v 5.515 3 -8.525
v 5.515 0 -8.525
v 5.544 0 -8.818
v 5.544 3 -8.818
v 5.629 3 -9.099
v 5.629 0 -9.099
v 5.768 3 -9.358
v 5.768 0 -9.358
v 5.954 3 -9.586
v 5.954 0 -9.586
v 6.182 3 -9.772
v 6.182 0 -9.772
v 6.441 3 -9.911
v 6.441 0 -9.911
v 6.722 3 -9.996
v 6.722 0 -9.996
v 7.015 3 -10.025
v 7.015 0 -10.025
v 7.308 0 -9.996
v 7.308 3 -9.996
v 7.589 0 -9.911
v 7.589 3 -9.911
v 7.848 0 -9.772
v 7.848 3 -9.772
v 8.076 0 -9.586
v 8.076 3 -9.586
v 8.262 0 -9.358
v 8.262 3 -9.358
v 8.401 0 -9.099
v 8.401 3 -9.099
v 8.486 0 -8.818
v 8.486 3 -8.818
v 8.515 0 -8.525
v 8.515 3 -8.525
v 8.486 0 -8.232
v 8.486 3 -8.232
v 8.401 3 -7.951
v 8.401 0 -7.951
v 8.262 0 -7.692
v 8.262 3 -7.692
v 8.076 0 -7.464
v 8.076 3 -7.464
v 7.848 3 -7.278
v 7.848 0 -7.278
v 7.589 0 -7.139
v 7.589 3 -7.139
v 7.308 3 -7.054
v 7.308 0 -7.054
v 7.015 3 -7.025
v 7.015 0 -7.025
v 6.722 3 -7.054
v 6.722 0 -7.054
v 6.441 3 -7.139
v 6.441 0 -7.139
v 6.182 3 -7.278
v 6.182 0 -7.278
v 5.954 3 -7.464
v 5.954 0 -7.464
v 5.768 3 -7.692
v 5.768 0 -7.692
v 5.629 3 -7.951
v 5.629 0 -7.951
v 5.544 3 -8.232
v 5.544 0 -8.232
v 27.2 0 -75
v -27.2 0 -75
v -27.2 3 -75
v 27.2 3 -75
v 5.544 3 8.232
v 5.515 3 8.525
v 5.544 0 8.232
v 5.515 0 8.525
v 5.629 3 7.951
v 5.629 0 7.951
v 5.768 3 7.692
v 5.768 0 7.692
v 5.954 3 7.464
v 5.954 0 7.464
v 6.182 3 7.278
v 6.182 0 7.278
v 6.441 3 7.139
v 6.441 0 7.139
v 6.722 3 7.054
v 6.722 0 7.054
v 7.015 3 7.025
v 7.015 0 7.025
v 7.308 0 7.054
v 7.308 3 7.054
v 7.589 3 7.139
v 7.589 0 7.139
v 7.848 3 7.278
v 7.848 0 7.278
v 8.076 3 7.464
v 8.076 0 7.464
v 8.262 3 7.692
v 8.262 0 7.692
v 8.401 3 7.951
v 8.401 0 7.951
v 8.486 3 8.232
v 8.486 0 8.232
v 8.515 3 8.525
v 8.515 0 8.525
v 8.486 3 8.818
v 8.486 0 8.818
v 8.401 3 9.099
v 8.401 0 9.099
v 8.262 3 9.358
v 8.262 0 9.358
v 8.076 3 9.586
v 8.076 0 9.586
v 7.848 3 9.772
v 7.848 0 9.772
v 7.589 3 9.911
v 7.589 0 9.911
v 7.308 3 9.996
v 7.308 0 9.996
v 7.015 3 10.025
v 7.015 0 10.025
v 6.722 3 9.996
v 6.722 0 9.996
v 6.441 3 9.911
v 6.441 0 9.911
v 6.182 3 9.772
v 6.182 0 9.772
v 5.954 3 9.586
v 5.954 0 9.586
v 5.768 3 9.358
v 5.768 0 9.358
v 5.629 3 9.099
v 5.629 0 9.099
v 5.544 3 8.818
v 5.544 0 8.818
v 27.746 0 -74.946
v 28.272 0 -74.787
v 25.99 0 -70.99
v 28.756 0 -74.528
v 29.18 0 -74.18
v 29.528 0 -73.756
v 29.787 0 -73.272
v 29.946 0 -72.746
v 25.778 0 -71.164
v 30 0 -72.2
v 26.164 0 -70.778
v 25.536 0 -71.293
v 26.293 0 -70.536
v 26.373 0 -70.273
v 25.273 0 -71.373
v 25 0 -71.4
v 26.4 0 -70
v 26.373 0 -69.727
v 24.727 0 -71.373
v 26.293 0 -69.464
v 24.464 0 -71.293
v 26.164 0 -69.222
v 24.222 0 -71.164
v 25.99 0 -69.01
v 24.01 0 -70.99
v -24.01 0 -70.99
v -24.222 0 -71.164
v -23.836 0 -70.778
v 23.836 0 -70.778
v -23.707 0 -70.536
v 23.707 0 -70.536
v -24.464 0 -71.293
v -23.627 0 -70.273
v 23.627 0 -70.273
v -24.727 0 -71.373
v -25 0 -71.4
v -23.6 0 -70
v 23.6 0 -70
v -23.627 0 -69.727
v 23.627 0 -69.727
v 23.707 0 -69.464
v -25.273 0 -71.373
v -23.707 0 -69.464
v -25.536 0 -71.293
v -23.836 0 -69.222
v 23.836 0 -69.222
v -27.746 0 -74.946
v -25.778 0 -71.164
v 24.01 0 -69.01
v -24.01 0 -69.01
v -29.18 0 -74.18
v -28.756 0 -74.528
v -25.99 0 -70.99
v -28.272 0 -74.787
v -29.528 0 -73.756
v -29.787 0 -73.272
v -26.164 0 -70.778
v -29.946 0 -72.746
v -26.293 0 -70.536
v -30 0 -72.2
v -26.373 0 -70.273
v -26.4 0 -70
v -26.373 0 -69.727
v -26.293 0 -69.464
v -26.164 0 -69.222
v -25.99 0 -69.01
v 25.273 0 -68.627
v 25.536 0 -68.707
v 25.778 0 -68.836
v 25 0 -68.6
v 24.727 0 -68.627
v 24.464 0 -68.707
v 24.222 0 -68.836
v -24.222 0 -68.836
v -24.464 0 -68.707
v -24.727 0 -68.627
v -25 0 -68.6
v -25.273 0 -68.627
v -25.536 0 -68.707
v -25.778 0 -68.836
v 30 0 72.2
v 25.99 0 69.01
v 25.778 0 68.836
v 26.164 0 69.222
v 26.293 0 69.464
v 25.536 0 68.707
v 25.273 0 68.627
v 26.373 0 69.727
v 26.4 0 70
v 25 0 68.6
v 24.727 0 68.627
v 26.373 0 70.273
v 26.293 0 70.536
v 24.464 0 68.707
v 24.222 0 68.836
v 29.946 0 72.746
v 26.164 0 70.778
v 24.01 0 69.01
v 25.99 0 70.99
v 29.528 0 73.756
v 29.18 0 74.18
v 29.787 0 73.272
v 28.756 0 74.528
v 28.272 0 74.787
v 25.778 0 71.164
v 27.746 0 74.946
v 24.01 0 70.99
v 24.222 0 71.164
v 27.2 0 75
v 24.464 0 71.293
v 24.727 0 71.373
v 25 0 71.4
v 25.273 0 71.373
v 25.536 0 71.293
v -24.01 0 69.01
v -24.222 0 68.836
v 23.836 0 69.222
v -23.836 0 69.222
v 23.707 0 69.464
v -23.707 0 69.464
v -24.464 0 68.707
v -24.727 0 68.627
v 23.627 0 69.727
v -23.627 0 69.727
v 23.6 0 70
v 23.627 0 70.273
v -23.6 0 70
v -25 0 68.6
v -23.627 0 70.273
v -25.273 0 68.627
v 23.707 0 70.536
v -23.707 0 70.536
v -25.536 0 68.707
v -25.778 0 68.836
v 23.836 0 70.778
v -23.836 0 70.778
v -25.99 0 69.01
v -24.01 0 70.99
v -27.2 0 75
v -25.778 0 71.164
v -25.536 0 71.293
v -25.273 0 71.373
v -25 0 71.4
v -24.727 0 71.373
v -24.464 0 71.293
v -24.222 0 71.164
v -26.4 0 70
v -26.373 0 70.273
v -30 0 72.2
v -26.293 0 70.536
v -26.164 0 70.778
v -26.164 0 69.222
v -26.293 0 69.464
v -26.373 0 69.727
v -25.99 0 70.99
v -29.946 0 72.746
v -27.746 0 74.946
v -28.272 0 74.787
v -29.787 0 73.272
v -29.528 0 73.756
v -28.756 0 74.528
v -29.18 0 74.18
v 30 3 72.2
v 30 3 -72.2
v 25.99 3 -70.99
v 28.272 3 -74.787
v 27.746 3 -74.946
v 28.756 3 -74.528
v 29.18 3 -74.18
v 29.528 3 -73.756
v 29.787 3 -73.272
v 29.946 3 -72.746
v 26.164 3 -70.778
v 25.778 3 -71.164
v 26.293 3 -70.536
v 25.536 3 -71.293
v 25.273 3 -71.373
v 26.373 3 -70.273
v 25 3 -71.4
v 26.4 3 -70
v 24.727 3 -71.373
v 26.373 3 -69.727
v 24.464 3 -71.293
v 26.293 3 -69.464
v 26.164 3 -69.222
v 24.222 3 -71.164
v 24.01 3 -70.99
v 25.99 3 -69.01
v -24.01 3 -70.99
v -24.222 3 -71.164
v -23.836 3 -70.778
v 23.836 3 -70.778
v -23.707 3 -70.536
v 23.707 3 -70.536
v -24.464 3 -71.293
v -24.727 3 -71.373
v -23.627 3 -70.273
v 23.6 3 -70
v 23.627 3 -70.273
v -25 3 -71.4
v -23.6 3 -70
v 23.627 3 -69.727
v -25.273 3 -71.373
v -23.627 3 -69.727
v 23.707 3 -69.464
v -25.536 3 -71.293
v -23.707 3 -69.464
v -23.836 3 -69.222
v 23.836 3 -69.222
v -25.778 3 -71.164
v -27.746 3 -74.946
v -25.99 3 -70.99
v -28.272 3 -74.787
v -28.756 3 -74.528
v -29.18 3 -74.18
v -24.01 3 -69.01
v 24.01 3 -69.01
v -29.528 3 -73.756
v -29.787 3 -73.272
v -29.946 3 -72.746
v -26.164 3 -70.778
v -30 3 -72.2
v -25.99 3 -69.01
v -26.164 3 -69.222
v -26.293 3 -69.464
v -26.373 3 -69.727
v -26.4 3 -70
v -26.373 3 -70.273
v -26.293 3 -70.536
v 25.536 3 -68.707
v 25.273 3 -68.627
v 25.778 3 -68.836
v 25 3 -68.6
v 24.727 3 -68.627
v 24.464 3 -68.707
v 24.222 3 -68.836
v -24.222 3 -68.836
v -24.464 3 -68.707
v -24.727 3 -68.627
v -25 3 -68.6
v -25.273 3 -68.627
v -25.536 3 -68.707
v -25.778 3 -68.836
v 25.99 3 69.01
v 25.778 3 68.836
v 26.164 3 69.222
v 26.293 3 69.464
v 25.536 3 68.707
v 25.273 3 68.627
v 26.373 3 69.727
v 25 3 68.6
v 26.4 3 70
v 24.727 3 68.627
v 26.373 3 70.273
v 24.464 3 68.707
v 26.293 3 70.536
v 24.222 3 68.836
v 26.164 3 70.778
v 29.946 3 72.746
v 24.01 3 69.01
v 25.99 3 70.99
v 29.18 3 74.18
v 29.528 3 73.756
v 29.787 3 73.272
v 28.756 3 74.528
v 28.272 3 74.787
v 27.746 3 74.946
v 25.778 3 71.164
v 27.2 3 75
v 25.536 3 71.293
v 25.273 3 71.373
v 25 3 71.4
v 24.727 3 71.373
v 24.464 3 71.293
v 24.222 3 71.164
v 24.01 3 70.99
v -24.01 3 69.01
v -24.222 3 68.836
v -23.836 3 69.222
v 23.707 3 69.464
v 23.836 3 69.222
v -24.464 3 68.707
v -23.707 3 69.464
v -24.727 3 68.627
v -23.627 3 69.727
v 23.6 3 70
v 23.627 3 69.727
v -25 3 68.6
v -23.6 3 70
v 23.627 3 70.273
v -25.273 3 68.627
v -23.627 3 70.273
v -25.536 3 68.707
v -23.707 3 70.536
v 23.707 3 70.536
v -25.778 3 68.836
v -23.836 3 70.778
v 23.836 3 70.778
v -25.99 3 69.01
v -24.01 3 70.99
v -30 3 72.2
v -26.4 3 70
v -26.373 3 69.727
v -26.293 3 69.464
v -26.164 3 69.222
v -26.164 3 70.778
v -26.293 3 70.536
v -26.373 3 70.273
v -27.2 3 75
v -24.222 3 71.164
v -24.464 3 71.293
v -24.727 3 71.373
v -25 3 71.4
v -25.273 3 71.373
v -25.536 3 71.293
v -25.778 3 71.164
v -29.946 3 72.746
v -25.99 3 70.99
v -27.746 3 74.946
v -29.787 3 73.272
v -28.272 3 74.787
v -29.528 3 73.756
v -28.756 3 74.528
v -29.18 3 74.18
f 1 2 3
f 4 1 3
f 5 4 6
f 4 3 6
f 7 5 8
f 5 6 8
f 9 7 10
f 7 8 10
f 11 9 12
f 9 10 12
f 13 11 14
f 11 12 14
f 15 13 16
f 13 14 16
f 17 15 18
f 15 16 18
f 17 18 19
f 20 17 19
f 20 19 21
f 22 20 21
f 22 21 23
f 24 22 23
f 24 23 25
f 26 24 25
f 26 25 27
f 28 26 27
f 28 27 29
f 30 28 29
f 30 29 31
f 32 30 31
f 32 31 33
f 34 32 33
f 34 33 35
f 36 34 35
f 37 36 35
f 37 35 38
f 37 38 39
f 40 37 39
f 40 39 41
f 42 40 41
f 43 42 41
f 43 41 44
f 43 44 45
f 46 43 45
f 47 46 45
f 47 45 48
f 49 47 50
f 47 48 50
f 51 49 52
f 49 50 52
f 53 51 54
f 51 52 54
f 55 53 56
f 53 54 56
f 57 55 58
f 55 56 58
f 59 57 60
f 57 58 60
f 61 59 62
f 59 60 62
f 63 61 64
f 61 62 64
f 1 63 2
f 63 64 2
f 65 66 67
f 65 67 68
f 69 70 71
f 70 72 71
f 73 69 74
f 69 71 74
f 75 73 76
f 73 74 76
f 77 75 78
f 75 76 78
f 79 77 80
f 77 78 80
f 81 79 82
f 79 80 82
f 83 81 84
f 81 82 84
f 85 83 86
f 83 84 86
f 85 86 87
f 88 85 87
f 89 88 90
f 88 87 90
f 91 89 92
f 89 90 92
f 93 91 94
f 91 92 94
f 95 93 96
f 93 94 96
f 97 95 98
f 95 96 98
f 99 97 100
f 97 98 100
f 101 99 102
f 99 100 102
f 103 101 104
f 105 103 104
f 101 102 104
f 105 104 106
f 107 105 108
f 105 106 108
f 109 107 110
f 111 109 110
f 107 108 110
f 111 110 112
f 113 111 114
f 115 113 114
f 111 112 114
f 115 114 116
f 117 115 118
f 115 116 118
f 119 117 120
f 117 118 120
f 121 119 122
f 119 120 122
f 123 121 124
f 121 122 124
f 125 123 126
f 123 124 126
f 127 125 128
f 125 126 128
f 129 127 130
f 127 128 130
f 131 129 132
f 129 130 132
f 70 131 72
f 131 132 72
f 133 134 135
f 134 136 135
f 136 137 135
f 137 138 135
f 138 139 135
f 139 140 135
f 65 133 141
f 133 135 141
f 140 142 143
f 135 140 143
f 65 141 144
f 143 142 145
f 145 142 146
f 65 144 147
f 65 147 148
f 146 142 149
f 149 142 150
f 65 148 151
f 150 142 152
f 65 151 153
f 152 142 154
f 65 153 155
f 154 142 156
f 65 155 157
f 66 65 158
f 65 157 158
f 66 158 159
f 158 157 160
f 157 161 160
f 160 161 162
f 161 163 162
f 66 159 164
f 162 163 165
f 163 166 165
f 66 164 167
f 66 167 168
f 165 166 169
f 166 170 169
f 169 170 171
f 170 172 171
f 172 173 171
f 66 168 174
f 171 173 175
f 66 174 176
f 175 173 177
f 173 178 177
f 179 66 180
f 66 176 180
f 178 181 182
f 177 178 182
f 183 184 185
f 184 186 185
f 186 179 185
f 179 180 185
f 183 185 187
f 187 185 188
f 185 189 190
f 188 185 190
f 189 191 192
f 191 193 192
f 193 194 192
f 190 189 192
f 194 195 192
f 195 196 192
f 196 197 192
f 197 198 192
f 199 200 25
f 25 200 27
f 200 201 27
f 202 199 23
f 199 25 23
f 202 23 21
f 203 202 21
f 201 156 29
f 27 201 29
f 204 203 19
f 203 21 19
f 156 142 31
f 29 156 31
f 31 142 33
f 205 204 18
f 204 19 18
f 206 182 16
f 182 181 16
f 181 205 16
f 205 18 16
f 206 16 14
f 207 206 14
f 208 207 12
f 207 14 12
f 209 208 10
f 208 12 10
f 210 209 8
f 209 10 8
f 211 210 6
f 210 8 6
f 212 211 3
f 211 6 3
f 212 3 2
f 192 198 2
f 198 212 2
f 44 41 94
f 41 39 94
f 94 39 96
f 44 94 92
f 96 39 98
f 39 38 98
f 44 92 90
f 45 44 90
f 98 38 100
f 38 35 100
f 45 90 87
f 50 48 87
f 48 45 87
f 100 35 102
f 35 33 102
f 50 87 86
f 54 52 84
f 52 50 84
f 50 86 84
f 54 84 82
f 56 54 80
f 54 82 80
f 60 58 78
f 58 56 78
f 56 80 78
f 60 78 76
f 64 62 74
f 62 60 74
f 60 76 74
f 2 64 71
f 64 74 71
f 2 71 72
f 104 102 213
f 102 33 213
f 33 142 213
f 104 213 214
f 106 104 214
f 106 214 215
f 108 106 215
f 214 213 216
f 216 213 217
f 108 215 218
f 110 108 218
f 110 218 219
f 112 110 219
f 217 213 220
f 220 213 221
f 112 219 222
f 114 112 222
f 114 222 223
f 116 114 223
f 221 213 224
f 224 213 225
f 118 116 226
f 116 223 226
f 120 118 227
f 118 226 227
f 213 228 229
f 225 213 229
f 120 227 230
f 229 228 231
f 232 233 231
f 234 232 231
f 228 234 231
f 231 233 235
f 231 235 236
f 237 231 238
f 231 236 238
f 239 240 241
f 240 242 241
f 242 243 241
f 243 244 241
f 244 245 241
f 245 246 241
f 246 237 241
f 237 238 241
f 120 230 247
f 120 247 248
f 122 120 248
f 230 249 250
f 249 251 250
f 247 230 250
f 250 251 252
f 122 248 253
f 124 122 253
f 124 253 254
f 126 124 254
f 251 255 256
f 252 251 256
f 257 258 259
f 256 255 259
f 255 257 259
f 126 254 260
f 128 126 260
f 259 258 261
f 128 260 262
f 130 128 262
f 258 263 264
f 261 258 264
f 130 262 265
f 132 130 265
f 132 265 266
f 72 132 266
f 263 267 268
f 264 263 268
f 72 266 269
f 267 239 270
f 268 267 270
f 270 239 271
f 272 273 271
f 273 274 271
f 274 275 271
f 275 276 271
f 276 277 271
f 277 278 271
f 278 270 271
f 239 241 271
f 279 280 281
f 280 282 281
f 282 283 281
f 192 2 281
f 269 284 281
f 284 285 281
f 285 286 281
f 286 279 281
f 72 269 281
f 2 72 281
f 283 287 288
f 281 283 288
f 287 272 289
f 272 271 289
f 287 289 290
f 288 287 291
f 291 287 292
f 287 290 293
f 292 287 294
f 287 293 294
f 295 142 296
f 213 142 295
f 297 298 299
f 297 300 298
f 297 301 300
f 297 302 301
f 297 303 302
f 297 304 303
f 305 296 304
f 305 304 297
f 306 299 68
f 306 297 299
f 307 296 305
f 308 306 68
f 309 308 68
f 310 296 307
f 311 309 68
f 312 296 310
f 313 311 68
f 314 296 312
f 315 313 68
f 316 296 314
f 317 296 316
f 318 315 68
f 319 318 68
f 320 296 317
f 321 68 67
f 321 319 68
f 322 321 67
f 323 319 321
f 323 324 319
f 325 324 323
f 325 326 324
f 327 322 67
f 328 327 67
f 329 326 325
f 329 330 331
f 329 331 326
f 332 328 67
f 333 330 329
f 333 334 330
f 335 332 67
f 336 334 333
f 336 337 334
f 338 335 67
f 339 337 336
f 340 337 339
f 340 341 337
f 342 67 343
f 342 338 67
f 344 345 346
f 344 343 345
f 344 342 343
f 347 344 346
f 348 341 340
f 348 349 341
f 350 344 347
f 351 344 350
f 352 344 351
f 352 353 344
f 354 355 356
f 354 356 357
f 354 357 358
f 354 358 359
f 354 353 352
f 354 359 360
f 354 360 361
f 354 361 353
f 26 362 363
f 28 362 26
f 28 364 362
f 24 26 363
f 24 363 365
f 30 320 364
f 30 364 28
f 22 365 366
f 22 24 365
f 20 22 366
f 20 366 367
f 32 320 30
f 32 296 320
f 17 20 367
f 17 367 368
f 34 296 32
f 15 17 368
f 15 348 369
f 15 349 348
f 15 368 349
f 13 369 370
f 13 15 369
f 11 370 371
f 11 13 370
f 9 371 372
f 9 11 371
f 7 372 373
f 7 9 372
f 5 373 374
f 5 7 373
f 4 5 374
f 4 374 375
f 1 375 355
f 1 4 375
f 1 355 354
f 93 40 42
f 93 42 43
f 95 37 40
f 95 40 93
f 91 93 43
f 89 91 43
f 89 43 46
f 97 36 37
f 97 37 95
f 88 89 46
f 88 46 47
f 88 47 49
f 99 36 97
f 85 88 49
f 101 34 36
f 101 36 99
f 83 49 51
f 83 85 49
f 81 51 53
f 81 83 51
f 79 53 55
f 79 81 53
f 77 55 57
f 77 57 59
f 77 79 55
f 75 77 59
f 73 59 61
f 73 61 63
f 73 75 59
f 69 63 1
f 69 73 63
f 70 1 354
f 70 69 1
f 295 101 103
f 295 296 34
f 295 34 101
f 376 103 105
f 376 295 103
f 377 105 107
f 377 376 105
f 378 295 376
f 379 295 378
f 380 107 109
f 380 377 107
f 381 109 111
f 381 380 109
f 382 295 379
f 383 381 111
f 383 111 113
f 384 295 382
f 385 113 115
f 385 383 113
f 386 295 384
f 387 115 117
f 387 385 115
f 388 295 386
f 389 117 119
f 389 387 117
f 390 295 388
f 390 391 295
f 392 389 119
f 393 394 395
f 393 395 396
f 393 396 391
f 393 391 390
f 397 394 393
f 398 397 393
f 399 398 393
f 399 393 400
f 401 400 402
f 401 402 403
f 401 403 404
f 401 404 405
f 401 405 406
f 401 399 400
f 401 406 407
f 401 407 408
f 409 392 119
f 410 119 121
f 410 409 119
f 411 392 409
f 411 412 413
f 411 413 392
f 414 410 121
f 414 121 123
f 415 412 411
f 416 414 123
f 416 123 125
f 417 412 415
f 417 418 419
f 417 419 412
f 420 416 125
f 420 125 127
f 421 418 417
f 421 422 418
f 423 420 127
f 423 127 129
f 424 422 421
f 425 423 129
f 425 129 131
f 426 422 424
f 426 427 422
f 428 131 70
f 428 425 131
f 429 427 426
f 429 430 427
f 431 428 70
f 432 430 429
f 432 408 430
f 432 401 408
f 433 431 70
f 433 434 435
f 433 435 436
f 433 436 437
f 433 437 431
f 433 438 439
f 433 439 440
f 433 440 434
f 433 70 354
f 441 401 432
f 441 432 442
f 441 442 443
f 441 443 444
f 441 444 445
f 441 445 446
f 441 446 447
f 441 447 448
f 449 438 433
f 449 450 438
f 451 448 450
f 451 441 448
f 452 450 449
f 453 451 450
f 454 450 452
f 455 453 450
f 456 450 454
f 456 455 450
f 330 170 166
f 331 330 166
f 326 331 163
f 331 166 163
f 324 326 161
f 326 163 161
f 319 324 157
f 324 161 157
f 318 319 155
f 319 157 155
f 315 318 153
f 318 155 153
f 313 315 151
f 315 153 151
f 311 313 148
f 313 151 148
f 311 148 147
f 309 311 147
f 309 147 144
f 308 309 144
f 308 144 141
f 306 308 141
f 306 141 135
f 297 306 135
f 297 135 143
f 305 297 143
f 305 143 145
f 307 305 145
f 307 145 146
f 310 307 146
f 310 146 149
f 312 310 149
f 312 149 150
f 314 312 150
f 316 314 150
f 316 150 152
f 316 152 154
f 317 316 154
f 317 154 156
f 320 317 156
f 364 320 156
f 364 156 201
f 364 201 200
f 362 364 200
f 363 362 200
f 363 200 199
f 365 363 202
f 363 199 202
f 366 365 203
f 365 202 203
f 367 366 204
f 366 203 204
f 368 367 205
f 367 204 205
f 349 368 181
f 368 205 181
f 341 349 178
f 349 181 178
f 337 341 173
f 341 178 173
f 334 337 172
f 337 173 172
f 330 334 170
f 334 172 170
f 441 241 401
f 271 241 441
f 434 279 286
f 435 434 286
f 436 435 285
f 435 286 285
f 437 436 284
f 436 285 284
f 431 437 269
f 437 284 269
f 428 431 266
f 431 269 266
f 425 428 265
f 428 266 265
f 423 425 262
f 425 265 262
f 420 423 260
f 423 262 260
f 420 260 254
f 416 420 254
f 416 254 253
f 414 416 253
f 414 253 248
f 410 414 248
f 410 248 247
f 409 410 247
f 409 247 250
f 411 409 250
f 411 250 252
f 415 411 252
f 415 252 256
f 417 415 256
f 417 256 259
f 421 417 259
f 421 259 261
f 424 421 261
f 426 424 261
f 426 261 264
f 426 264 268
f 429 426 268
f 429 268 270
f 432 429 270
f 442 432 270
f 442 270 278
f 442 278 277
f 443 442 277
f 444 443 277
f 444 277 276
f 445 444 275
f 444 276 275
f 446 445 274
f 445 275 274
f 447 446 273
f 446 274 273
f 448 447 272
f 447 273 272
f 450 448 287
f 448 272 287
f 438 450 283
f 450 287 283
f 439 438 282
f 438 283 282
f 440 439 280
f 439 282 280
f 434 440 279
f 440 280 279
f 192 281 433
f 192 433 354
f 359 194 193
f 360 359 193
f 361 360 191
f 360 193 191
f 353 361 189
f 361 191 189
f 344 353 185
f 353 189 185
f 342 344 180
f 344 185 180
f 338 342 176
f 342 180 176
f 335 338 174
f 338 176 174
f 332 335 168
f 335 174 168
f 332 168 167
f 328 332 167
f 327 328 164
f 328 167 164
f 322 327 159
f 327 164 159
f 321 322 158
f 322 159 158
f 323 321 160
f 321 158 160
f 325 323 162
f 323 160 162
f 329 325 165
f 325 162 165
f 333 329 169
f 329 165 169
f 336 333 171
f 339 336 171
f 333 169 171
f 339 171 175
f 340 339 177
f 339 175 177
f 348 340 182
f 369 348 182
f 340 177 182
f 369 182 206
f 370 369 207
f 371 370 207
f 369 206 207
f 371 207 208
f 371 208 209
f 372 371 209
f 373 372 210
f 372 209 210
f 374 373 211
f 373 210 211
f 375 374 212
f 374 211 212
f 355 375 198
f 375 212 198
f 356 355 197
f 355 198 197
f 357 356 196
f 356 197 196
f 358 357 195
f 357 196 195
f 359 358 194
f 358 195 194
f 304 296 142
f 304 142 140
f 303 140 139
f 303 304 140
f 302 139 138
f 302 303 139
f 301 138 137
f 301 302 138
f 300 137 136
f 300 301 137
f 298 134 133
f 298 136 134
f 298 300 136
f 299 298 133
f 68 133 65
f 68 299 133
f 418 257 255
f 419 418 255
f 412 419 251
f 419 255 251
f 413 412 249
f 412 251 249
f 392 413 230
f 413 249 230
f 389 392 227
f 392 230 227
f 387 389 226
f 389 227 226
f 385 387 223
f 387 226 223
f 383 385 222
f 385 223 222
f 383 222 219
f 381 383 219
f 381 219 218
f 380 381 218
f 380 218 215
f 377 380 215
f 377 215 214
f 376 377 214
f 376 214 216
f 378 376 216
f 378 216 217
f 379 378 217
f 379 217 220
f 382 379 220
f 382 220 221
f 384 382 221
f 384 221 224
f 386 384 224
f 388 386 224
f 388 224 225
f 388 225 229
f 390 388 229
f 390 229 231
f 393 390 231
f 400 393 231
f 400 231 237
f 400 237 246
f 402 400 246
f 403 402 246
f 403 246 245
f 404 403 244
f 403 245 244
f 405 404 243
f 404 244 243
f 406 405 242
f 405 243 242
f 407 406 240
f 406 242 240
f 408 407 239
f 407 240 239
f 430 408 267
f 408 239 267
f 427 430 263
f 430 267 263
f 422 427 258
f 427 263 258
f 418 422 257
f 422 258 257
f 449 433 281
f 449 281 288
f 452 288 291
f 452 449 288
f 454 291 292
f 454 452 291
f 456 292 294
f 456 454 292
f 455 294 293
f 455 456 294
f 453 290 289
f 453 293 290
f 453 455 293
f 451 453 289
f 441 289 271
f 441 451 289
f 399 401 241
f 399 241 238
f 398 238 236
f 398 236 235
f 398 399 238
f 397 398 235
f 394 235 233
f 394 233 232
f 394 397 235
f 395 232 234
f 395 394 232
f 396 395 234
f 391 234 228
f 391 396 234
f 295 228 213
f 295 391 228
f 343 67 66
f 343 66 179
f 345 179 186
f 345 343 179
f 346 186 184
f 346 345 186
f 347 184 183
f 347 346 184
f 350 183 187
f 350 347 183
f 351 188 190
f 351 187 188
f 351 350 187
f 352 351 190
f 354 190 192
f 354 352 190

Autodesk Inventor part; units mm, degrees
ref_plane "YZ Plane" through (0, 0, 0) normal (1, 0, 0) x (0, 1, 0)
ref_plane "XZ Plane" through (0, 0, 0) normal (0, 1, 0) x (-1, 0, 0)
ref_plane "XY Plane" through (0, 0, 0) normal (0, 0, 1) x (1, 0, 0)
sketch "Sketch1" plane through (0, 0, 0) normal (0, 1, 0) x (-1, 0, 0)
  line L0 (-30, 75) -> (30, 75)
  line L1 (30, 75) -> (30, -75)
  line L2 (30, -75) -> (-30, -75)
  line L3 (-30, -75) -> (-30, 75)
  line L4 (30, 75) -> (25, 75)
  line L5 (25, 75) -> (25, 70)
  line L6 (25, 70) -> (30, 70)
  line L7 (30, 70) -> (30, 75)
  line L8 (-30, 75) -> (-25, 75)
  line L9 (-25, 75) -> (-25, 70)
  line L10 (-25, 70) -> (-30, 70)
  line L11 (-30, 70) -> (-30, 75)
  line L12 (30, -75) -> (25, -75)
  line L13 (25, -75) -> (25, -70)
  line L14 (25, -70) -> (30, -70)
  line L15 (30, -70) -> (30, -75)
  line L16 (-30, -75) -> (-25, -75)
  line L17 (-25, -75) -> (-25, -70)
  line L18 (-25, -70) -> (-30, -70)
  line L19 (-30, -70) -> (-30, -75)
  circle A0 centre (25, 70) radius 1.4
  circle A1 centre (-25, 70) radius 1.4
  circle A2 centre (25, -70) radius 1.4
  circle A3 centre (-25, -70) radius 1.4
  line L20 (-9.515, 11.025) -> (9.515, 11.025)
  line L21 (9.515, 11.025) -> (9.515, -11.025)
  line L22 (9.515, -11.025) -> (-9.515, -11.025)
  line L23 (-9.515, -11.025) -> (-9.515, 11.025)
  line L24 (-9.515, 11.025) -> (9.515, -11.025) construction
  line L25 (9.515, 11.025) -> (-9.515, -11.025) construction
  line L26 (-9.515, -11.025) -> (-7.015, -11.025)
  line L27 (-7.015, -11.025) -> (-7.015, -8.525)
  line L28 (-7.015, -8.525) -> (-9.515, -8.525)
  line L29 (-9.515, -8.525) -> (-9.515, -11.025)
  line L30 (-9.515, 11.025) -> (-7.015, 11.025)
  line L31 (-7.015, 11.025) -> (-7.015, 8.525)
  line L32 (-7.015, 8.525) -> (-9.515, 8.525)
  line L33 (-9.515, 8.525) -> (-9.515, 11.025)
  circle A4 centre (-7.015, 8.525) radius 1.5
  circle A5 centre (-7.015, -8.525) radius 1.5
  line L34 (9.515, 0) -> (8.515, 0)
  line L35 (6.515, -11.025) -> (10.515, -11.025)
  line L36 (10.515, -11.025) -> (10.515, 11.025)
  line L37 (10.515, 11.025) -> (6.515, 11.025)
  line L38 (6.515, 11.025) -> (6.515, -11.025)
  line L39 (6.515, -11.025) -> (10.515, 11.025) construction
  line L40 (10.515, -11.025) -> (6.515, 11.025) construction
  line L41 (0, -75) -> (-20, -75)
  line L42 (0, -75) -> (20, -75)
  point P0 (0, 0)
  point P1 (0, 0)
  dimension "d0" = 60
  dimension "d1" = 150
  dimension "d2" = 5
  dimension "d3" = 5
  dimension "d4" = 5
  dimension "d5" = 5
  dimension "d6" = 5
  dimension "d8" = 5
  dimension "d10" = 2.8
  dimension "d11" = 2.8
  dimension "d12" = 19.03
  dimension "d13" = 22.05
  dimension "d14" = 2.5
  dimension "d15" = 2.5
  dimension "d16" = 2.5
  dimension "d17" = 2.5
  dimension "d18" = 3
  dimension "d19" = 3
  dimension "d20" = 1
  dimension "d21" = 4
extrude "Extrusion1" add sketch "Sketch1" along normal blind 3 contours L0 L9 A1 L10 L3 | L0 L5 A0 L6 L1 L14 A2 L13 L2 L17 A3 L18 L3 L10 A1 L9 | L0 L1 L6 A0 L5 | L18 A3 L17 L2 L3 | L1 L2 L13 A2 L14 | L20 L31 A4 L32 L23 | L20 L38 L22 L27 A5 L28 L23 L32 A4 L31 | L20 L21 L22 L38 | L28 A5 L27 L22 L23 | L37 L36 L35 L21
fillet "Fillet1" radius 2.8 1 edges at (30, 1.5, 75)
fillet "Fillet2" radius 2.8 1 edges at (-30, 1.5, 75)
fillet "Fillet3" radius 2.8 1 edges at (-30, 1.5, -75)
fillet "Fillet4" radius 2.8 1 edges at (30, 1.5, -75)
properties part number "MatTren"
